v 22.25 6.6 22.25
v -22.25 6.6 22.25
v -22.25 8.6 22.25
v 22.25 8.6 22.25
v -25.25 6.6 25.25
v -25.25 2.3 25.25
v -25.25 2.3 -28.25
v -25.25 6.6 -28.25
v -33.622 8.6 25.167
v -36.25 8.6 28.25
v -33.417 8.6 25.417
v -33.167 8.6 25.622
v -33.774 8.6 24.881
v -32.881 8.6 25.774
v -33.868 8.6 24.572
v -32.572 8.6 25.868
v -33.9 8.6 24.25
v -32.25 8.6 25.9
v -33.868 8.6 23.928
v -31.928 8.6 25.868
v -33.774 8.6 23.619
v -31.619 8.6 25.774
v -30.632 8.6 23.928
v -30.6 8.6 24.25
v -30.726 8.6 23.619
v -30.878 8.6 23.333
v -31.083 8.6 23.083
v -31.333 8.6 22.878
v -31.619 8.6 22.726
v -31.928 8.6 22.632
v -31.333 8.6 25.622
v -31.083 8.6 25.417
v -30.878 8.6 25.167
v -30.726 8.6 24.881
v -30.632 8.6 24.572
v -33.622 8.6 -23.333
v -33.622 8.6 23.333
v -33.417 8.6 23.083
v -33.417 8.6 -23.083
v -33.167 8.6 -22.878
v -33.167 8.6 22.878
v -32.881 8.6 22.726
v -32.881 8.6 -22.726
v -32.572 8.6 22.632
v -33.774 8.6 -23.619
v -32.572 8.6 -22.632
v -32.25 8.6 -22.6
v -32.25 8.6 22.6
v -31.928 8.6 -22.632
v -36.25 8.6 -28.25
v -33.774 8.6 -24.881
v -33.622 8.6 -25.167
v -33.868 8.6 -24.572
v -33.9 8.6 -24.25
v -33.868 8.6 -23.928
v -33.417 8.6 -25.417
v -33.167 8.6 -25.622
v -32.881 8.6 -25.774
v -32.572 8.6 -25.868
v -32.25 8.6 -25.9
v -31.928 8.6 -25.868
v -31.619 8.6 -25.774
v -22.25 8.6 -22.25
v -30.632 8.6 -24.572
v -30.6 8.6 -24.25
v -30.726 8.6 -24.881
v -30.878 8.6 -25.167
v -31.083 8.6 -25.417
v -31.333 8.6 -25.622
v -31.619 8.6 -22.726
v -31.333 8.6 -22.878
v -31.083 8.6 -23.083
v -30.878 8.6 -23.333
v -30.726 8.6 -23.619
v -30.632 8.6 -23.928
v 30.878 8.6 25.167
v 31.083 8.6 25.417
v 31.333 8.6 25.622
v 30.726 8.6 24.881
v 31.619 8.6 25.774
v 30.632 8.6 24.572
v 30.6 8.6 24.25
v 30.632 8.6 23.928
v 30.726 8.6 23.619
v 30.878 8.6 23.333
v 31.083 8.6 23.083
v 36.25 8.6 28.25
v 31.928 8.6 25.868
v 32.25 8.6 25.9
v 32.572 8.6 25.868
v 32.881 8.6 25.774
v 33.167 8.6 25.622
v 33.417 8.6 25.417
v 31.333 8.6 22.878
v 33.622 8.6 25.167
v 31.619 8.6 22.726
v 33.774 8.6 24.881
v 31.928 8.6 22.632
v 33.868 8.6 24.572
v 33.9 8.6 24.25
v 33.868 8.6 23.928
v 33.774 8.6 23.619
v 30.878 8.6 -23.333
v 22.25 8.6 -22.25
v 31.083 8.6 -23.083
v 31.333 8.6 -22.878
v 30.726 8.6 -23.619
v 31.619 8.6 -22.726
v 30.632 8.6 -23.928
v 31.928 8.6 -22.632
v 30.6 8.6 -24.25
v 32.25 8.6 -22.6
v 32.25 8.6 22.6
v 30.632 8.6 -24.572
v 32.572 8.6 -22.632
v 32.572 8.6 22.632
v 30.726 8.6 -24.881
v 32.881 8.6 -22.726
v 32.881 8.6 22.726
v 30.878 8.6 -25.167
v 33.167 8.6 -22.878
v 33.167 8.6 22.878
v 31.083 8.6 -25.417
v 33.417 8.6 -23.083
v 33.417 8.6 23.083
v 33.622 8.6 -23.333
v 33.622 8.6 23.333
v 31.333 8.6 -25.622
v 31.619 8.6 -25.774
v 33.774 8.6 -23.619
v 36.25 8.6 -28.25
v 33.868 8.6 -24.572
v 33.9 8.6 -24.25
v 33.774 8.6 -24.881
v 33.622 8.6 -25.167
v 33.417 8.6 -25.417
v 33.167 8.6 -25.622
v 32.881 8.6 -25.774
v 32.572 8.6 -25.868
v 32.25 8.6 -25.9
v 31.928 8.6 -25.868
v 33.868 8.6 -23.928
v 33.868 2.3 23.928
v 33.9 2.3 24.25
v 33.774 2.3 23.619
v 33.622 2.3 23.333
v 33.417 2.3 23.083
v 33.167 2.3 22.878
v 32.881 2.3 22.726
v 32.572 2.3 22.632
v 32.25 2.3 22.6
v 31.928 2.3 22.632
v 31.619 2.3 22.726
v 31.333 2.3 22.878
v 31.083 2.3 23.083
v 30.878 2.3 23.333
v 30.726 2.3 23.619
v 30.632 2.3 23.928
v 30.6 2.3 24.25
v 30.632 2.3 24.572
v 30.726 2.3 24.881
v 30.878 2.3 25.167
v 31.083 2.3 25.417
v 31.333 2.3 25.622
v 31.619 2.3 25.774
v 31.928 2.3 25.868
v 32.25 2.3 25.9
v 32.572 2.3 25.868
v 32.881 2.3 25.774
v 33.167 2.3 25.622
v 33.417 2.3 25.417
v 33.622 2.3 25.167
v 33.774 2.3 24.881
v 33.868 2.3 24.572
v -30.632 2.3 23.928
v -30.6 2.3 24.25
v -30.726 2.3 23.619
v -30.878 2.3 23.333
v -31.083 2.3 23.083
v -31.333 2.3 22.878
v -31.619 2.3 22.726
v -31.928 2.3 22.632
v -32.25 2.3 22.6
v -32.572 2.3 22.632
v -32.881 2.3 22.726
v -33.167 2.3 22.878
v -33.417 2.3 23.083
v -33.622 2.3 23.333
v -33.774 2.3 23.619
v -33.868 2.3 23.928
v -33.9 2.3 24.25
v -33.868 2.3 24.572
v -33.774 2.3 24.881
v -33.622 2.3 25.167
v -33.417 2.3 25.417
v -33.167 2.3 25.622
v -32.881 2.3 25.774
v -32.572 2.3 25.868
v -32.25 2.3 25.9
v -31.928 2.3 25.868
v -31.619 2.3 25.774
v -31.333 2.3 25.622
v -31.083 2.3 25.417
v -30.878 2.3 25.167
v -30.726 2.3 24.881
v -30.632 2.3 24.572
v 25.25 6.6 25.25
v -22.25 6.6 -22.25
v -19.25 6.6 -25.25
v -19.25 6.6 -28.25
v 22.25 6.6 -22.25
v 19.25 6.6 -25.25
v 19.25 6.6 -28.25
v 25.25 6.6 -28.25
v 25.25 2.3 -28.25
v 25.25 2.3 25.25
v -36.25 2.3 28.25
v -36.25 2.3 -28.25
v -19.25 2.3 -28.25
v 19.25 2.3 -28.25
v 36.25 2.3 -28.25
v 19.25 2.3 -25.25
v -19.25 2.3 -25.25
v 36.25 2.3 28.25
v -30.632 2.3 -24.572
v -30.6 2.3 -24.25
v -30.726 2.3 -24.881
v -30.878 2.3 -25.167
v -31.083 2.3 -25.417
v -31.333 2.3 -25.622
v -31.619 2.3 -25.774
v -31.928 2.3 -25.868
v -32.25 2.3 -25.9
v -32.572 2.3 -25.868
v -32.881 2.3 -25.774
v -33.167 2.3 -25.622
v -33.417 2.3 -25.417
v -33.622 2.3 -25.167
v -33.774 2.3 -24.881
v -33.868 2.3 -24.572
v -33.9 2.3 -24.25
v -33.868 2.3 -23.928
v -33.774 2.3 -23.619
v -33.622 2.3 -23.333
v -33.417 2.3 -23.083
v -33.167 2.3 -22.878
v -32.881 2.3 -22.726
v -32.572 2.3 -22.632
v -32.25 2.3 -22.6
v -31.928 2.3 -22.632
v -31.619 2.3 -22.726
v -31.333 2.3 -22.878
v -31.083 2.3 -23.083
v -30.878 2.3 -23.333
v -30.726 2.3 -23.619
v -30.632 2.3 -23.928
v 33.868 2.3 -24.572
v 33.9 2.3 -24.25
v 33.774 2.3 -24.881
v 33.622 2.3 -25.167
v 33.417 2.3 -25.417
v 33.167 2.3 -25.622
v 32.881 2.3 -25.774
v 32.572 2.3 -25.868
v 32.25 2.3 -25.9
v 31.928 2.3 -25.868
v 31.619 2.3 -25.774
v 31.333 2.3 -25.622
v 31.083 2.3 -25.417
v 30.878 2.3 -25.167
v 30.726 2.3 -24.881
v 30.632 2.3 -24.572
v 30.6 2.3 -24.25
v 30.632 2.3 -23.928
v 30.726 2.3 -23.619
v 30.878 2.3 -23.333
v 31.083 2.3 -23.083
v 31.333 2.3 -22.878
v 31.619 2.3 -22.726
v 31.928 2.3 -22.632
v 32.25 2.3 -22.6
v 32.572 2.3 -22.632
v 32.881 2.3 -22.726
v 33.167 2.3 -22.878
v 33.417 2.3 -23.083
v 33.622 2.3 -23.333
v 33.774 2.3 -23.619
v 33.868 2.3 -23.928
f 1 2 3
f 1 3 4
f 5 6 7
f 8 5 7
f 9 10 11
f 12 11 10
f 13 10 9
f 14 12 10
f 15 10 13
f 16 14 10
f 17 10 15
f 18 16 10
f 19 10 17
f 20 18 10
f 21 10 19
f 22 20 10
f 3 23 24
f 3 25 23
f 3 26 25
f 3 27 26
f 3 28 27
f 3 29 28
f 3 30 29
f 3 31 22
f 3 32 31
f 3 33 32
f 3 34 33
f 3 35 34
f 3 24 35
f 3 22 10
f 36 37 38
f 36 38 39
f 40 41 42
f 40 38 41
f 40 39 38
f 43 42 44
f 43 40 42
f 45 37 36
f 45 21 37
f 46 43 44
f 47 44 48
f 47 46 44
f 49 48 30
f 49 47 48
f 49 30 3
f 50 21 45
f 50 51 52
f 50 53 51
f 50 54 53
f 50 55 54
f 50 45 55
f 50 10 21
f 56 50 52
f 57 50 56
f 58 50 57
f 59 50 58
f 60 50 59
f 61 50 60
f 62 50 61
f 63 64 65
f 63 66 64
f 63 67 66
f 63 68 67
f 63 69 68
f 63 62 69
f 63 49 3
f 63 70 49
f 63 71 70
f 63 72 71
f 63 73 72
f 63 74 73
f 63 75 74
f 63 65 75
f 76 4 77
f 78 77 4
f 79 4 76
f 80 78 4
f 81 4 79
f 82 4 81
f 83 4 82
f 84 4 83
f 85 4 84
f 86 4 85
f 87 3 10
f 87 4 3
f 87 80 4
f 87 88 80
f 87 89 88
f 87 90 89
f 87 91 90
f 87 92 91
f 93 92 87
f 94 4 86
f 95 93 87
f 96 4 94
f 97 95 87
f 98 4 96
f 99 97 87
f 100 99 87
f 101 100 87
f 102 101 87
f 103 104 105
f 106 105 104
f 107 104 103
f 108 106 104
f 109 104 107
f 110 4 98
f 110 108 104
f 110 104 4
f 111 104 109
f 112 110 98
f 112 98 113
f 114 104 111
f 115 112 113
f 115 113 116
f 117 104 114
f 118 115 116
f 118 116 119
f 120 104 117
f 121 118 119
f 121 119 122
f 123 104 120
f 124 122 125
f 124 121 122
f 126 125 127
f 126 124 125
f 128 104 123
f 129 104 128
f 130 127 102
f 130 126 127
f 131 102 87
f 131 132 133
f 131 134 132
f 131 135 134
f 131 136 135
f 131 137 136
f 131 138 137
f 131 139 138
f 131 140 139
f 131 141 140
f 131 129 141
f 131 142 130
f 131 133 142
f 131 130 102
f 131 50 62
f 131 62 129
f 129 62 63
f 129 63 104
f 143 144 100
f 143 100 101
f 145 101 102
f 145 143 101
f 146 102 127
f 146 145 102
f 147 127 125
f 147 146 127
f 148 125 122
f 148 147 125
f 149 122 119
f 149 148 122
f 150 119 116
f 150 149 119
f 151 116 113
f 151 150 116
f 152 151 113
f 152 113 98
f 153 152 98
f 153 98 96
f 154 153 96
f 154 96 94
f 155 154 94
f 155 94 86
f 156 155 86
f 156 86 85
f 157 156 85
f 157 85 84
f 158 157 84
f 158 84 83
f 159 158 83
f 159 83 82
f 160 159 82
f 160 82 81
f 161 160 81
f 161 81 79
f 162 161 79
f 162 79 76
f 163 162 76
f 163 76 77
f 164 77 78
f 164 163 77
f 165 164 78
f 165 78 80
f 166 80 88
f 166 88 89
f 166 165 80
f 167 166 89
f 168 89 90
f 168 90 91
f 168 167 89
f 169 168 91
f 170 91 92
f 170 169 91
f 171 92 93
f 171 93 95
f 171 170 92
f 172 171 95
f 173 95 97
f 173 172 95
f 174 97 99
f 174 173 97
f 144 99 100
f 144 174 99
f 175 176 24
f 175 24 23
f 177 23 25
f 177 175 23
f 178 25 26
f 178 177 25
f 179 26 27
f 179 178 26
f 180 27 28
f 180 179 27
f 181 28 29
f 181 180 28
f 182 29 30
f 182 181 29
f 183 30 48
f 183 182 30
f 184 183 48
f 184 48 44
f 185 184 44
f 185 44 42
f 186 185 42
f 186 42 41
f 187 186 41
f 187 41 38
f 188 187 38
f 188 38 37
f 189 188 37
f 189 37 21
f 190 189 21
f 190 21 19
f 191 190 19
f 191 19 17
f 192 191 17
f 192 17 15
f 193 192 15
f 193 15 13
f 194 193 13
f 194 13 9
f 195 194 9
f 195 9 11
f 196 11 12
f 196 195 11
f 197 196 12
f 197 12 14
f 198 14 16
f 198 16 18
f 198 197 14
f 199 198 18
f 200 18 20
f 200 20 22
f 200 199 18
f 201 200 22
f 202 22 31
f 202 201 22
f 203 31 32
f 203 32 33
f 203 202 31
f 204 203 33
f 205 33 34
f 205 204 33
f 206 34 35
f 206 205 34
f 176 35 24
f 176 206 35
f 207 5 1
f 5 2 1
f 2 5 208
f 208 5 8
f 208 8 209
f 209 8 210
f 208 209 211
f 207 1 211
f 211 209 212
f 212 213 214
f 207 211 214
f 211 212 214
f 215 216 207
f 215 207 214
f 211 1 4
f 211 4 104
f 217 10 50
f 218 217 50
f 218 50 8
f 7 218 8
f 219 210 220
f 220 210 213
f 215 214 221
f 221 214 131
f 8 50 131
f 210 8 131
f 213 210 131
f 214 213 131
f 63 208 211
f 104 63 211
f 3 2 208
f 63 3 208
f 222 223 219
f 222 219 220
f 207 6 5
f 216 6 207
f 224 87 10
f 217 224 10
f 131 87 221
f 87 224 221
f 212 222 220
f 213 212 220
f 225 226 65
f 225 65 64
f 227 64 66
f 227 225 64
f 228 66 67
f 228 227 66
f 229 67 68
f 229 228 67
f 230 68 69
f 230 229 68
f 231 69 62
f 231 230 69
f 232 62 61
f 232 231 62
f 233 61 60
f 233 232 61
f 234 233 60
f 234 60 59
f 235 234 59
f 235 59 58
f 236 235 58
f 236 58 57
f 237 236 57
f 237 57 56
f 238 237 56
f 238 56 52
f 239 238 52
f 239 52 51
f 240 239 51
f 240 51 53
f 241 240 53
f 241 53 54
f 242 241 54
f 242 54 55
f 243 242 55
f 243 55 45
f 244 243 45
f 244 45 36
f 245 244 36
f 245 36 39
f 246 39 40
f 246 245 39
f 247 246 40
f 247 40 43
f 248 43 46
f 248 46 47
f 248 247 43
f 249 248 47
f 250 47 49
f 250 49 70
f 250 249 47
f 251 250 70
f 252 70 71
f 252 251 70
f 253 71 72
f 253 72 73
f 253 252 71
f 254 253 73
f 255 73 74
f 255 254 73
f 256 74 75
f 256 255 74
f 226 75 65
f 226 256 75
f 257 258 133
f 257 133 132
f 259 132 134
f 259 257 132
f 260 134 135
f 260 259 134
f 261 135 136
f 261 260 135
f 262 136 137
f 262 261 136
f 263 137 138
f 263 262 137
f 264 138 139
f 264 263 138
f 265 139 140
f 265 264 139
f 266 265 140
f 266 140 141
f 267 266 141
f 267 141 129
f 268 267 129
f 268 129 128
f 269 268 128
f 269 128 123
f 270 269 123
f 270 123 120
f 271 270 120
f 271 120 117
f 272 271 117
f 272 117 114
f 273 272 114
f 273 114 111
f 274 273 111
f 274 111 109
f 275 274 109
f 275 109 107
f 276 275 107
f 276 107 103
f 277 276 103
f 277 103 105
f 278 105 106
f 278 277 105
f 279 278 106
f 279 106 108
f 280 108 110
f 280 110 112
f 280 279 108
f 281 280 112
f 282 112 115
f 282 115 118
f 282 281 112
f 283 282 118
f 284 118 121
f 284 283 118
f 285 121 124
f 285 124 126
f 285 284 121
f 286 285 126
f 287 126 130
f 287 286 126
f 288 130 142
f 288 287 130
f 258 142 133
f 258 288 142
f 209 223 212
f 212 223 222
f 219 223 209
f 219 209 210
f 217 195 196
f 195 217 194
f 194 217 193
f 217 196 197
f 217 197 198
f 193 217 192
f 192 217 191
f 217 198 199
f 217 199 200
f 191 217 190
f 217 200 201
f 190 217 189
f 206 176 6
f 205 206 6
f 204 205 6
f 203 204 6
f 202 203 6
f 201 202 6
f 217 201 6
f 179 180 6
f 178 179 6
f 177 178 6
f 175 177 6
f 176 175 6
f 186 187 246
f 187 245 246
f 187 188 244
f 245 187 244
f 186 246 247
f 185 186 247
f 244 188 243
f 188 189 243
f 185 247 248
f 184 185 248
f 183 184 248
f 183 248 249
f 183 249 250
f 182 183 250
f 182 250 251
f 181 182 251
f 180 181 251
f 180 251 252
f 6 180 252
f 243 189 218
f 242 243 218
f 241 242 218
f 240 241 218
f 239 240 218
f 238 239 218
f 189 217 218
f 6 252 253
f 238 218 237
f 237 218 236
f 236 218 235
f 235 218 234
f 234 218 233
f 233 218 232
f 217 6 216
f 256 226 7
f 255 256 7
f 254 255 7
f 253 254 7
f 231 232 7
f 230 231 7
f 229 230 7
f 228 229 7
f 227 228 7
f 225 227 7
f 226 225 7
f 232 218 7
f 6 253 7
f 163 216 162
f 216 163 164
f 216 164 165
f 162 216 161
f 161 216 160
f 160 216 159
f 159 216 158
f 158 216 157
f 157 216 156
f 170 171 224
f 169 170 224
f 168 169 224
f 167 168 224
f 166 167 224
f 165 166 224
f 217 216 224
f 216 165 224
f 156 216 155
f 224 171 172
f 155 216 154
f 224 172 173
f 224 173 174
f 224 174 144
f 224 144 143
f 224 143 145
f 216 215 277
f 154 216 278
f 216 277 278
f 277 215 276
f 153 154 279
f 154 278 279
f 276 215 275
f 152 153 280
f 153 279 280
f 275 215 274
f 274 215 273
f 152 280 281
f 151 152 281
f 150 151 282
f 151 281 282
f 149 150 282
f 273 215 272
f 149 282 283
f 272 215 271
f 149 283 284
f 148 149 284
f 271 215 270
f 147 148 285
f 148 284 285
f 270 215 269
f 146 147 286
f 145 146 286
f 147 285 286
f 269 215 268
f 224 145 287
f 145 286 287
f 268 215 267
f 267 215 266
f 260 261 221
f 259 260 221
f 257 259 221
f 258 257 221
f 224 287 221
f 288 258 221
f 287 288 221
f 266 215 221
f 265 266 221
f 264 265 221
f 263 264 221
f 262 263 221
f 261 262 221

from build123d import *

# Parameters (mm, degrees)
SKETCH1_W           = 56.5
SKETCH1_H           = 56.5
SKETCH1_W_2         = 50.5
SKETCH1_H_2         = 50.5
SKETCH1_R           = 1.65
BOSS_EXTRUDE1_DEPTH = 8.6
SKETCH2_W           = 50.5
SKETCH2_H           = 50.5
SKETCH2_W_2         = 44.5
SKETCH2_H_2         = 44.5
BOSS_EXTRUDE2_DEPTH = 2
BOSS_EXTRUDE3_START = 6.6
SKETCH4_W           = 50.5
SKETCH4_H           = 50.5
SKETCH4_W_2         = 44.5
SKETCH4_H_2         = 44.5
BOSS_EXTRUDE3_DEPTH = 2
CUT_EXTRUDE1_START  = 2
SKETCH5_W           = 6
SKETCH5_H           = 17.961455198
CUT_EXTRUDE1_DEPTH  = 4.6
SKETCH6_W           = 87.3205389
SKETCH6_H           = 82.15723747
CUT_EXTRUDE2_DEPTH  = 2.3
CUT_EXTRUDE4_DEPTH  = 10
SKETCH8_W           = 8
SKETCH8_H           = 40.5
BOSS_EXTRUDE4_DEPTH = 6.3


with BuildPart() as part:
    # Sketch1 → Boss-Extrude1 (new body)
    with BuildSketch(Plane(origin=(0, 0, 0), x_dir=(1, 0, 0), z_dir=(0, 1, 0))):
        Rectangle(SKETCH1_W, SKETCH1_H)
        Rectangle(SKETCH1_W_2, SKETCH1_H_2, mode=Mode.SUBTRACT)
        Polygon((-28.25, -28.25), (-28.25, -12.25), (-36.25, -20.25), (-36.25, -30.25), (-32.25, -34.25), (-24.25, -34.25), (-18.25, -28.25), align=None)
        with Locations((-32.25, -24.25)):
            Circle(SKETCH1_R, mode=Mode.SUBTRACT)
        Polygon((28.25, -28.25), (18.25, -28.25), (24.25, -34.25), (32.25, -34.25), (36.25, -30.25), (36.25, -20.25), (28.25, -12.25), align=None)
        with Locations((32.25, -24.25)):
            Circle(SKETCH1_R, mode=Mode.SUBTRACT)
        Polygon((24.25, 34.25), (18.25, 28.25), (28.25, 28.25), (28.25, 12.25), (36.25, 20.25), (36.25, 30.25), (32.25, 34.25), align=None)
        with Locations((32.25, 24.25)):
            Circle(SKETCH1_R, mode=Mode.SUBTRACT)
        Polygon((-36.25, 20.25), (-28.25, 12.25), (-28.25, 28.25), (-18.25, 28.25), (-24.25, 34.25), (-32.25, 34.25), (-36.25, 30.25), align=None)
        with Locations((-32.25, 24.25)):
            Circle(SKETCH1_R, mode=Mode.SUBTRACT)
    extrude(amount=BOSS_EXTRUDE1_DEPTH)

    # Sketch2 → Boss-Extrude2 (add)
    with BuildSketch(Plane(origin=(0, 0, 0), x_dir=(1, 0, 0), z_dir=(0, 1, 0))):
        Rectangle(SKETCH2_W, SKETCH2_H)
        Rectangle(SKETCH2_W_2, SKETCH2_H_2, mode=Mode.SUBTRACT)
    extrude(amount=BOSS_EXTRUDE2_DEPTH)

    # Sketch4 → Boss-Extrude3 (add)
    with BuildSketch(Plane(origin=(0, 0, 0), x_dir=(1, 0, 0), z_dir=(0, 1, 0)).offset(BOSS_EXTRUDE3_START)):
        Rectangle(SKETCH4_W, SKETCH4_H)
        Rectangle(SKETCH4_W_2, SKETCH4_H_2, mode=Mode.SUBTRACT)
    extrude(amount=BOSS_EXTRUDE3_DEPTH)

    # Sketch5 → Cut-Extrude1 (cut)
    with BuildSketch(Plane(origin=(0, 0, 0), x_dir=(1, 0, 0), z_dir=(0, 1, 0)).offset(CUT_EXTRUDE1_START)):
        with Locations((-22.25, 28.869783692)):
            Rectangle(SKETCH5_W, SKETCH5_H)
        with Locations((22.25, 28.869783692)):
            Rectangle(SKETCH5_W, SKETCH5_H)
    extrude(amount=CUT_EXTRUDE1_DEPTH, mode=Mode.SUBTRACT)

    # Sketch6 → Cut-Extrude2 (cut)
    with BuildSketch(Plane.XZ):
        with Locations((1.898272585, -1.518618068)):
            Rectangle(SKETCH6_W, SKETCH6_H)
    extrude(amount=-CUT_EXTRUDE2_DEPTH, mode=Mode.SUBTRACT)

    # Sketch7 → Cut-Extrude4 (cut)
    with BuildSketch(Plane(origin=(0, 8.6, 0), x_dir=(1, 0, 0), z_dir=(0, 1, 0))):
        Polygon((-36.25, -30.25), (-36.25, -28.25), (-40.881768663, -28.25), (-40.881768663, -34.995320637), (0, -34.995320637), (0, -28.25), (-18.25, -28.25), (-24.25, -34.25), (-32.25, -34.25), align=None)
        Polygon((18.25, -28.25), (0, -28.25), (0, -34.995320637), (39.184342226, -34.995320637), (39.184342226, -28.25), (36.25, -28.25), (36.25, -30.25), (32.25, -34.25), (24.25, -34.25), align=None)
        Polygon((36.25, 20.25), (36.25, -20.25), (28.25, -12.25), (28.25, 12.25), align=None)
        Polygon((-36.25, 20.25), (-36.25, -20.25), (-28.25, -12.25), (-28.25, 12.25), align=None)
        Polygon((-36.25, 30.25), (-36.25, 28.25), (-18.25, 28.25), (-24.25, 34.25), (-32.25, 34.25), align=None)
        Polygon((-38.207606214, 28.25), (-36.25, 28.25), (-36.25, 30.25), (-32.25, 34.25), (-24.25, 34.25), (-18.25, 28.25), (0, 28.25), (0, 36.724555445), (-38.207606214, 36.724555445), align=None)
        Polygon((28.25, 12.25), (36.25, 20.25), (28.25, 20.25), align=None)
        Polygon((28.25, -20.25), (36.25, -20.25), (28.25, -12.25), align=None)
        Polygon((-18.25, -28.25), (-36.25, -28.25), (-36.25, -30.25), (-32.25, -34.25), (-24.25, -34.25), align=None)
        Polygon((-28.25, -12.25), (-36.25, -20.25), (-28.25, -20.25), align=None)
        Polygon((-28.25, 20.25), (-36.25, 20.25), (-28.25, 12.25), align=None)
        Polygon((24.25, 34.25), (18.25, 28.25), (36.25, 28.25), (36.25, 30.25), (32.25, 34.25), align=None)
        Polygon((0, 36.724555445), (0, 28.25), (18.25, 28.25), (24.25, 34.25), (32.25, 34.25), (36.25, 30.25), (36.25, 28.25), (40.981198071, 28.25), (40.981198071, 36.724555445), align=None)
        Polygon((36.25, -28.25), (18.25, -28.25), (24.25, -34.25), (32.25, -34.25), (36.25, -30.25), align=None)
    extrude(amount=-CUT_EXTRUDE4_DEPTH, mode=Mode.SUBTRACT)

    # Sketch8 → Boss-Extrude4 (add)
    with BuildSketch(Plane(origin=(0, 8.6, 0), x_dir=(1, 0, 0), z_dir=(0, 1, 0))):
        with Locations((-32.25, 0)):
            Rectangle(SKETCH8_W, SKETCH8_H)
        with Locations((32.25, 0)):
            Rectangle(SKETCH8_W, SKETCH8_H)
    extrude(amount=-BOSS_EXTRUDE4_DEPTH)


solid = part.part
